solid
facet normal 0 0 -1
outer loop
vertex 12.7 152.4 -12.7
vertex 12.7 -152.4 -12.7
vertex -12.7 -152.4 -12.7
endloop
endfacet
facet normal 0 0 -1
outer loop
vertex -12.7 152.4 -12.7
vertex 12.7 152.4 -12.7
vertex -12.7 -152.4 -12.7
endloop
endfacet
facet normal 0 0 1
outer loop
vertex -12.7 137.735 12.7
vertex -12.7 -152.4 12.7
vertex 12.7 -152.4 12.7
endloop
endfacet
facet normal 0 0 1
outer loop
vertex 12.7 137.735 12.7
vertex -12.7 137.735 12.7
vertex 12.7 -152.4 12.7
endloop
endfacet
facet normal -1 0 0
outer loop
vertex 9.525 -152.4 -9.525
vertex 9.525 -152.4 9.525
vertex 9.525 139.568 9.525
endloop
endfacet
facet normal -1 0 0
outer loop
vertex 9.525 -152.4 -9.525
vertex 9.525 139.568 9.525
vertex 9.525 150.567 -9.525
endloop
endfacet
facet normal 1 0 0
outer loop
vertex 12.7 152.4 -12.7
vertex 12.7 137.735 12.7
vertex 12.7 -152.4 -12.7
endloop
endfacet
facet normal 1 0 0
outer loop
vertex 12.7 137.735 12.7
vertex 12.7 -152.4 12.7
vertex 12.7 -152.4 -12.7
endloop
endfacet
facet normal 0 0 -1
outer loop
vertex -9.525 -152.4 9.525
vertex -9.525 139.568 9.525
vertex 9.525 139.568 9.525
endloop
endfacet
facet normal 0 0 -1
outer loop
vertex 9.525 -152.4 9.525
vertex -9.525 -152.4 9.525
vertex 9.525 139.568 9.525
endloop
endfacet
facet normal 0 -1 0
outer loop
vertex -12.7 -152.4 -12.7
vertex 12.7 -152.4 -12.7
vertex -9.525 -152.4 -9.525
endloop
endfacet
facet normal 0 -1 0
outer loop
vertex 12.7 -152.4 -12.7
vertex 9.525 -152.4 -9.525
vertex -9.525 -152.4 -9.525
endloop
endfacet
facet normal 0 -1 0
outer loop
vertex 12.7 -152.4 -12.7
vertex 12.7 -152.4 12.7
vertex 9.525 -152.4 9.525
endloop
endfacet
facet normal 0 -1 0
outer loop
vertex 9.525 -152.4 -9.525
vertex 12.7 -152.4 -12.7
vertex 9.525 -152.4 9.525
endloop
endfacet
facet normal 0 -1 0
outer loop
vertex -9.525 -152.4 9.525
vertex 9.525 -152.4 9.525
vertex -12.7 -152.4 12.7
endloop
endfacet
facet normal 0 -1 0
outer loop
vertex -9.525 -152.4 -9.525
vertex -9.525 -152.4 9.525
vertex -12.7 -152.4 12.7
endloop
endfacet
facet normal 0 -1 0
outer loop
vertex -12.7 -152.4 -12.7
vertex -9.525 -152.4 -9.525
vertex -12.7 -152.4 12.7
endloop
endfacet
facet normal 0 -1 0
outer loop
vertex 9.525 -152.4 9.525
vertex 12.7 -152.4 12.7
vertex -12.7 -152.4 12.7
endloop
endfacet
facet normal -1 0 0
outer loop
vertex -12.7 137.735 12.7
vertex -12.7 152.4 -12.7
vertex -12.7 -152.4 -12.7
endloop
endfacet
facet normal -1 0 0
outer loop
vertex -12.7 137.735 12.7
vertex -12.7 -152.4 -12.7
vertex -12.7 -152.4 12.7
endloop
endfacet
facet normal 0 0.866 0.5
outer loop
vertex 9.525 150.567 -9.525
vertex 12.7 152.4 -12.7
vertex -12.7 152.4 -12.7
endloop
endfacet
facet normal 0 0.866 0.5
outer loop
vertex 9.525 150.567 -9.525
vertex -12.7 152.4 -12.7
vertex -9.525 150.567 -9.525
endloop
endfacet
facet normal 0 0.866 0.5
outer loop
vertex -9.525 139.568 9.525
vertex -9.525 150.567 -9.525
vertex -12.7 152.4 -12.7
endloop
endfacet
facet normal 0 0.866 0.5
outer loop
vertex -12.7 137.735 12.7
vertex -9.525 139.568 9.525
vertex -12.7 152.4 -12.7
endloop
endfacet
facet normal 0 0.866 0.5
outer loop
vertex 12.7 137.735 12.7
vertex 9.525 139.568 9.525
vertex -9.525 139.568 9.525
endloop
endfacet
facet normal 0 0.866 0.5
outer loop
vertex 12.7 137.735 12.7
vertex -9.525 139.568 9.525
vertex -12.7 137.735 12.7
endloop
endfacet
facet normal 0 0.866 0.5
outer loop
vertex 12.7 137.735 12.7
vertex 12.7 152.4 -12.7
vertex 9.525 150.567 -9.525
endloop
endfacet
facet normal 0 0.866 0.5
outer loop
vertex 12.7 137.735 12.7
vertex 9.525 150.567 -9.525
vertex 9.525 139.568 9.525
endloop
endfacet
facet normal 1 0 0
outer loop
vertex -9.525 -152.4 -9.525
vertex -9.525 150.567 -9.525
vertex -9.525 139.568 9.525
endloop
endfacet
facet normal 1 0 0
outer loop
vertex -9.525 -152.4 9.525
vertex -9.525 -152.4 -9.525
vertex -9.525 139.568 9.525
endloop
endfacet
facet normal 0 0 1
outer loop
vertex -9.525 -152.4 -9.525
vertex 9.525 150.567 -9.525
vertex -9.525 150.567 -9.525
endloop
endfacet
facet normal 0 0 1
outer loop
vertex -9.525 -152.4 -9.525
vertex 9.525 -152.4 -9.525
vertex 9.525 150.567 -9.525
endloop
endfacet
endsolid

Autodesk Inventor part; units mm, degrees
ref_plane "YZ Plane" through (0, 0, 0) normal (1, 0, 0) x (0, 1, 0)
ref_plane "XZ Plane" through (0, 0, 0) normal (0, 1, 0) x (-1, 0, 0)
ref_plane "XY Plane" through (0, 0, 0) normal (0, 0, 1) x (1, 0, 0)
sketch "Sketch1" plane through (0, 0, 0) normal (0, 1, 0) x (-1, 0, 0)
  line L0 (12.7, 12.7) -> (-12.7, 12.7)
  line L1 (-12.7, 12.7) -> (-12.7, -12.7)
  line L2 (-12.7, -12.7) -> (12.7, -12.7)
  line L3 (12.7, -12.7) -> (12.7, 12.7)
  line L4 (12.7, 12.7) -> (-12.7, -12.7) construction
  line L5 (-12.7, 12.7) -> (12.7, -12.7) construction
  line L6 (9.525, 9.525) -> (-9.525, 9.525)
  line L7 (-9.525, 9.525) -> (-9.525, -9.525)
  line L8 (-9.525, -9.525) -> (9.525, -9.525)
  line L9 (9.525, -9.525) -> (9.525, 9.525)
  line L10 (9.525, 9.525) -> (-9.525, -9.525) construction
  line L11 (-9.525, 9.525) -> (9.525, -9.525) construction
  point P0 (0, 0)
  dimension "d0" = 25.4
  dimension "d1" = 25.4
  dimension "d2" = 3.175
extrude "Extrusion1" add sketch "Sketch1" along normal mid plane 304.8
sketch "Sketch2" plane through (12.7, -152.4, -12.7) normal (1, 0, 0) x (0, 0, -1)
  line L0 (0, 0) -> (0, 304.8) projected
  line L1 (0, 304.8) -> (-25.4, 290.1353)
  line L2 (-25.4, 0) -> (-25.4, 304.8) projected
  line L3 (-25.4, 304.8) -> (0, 304.8)
  point P0 (-12.7, 152.4)
  dimension "d8" = 30
extrude "Extrusion2" cut sketch "Sketch2" against normal through all
properties part number "sideAluminumExtrusion"
